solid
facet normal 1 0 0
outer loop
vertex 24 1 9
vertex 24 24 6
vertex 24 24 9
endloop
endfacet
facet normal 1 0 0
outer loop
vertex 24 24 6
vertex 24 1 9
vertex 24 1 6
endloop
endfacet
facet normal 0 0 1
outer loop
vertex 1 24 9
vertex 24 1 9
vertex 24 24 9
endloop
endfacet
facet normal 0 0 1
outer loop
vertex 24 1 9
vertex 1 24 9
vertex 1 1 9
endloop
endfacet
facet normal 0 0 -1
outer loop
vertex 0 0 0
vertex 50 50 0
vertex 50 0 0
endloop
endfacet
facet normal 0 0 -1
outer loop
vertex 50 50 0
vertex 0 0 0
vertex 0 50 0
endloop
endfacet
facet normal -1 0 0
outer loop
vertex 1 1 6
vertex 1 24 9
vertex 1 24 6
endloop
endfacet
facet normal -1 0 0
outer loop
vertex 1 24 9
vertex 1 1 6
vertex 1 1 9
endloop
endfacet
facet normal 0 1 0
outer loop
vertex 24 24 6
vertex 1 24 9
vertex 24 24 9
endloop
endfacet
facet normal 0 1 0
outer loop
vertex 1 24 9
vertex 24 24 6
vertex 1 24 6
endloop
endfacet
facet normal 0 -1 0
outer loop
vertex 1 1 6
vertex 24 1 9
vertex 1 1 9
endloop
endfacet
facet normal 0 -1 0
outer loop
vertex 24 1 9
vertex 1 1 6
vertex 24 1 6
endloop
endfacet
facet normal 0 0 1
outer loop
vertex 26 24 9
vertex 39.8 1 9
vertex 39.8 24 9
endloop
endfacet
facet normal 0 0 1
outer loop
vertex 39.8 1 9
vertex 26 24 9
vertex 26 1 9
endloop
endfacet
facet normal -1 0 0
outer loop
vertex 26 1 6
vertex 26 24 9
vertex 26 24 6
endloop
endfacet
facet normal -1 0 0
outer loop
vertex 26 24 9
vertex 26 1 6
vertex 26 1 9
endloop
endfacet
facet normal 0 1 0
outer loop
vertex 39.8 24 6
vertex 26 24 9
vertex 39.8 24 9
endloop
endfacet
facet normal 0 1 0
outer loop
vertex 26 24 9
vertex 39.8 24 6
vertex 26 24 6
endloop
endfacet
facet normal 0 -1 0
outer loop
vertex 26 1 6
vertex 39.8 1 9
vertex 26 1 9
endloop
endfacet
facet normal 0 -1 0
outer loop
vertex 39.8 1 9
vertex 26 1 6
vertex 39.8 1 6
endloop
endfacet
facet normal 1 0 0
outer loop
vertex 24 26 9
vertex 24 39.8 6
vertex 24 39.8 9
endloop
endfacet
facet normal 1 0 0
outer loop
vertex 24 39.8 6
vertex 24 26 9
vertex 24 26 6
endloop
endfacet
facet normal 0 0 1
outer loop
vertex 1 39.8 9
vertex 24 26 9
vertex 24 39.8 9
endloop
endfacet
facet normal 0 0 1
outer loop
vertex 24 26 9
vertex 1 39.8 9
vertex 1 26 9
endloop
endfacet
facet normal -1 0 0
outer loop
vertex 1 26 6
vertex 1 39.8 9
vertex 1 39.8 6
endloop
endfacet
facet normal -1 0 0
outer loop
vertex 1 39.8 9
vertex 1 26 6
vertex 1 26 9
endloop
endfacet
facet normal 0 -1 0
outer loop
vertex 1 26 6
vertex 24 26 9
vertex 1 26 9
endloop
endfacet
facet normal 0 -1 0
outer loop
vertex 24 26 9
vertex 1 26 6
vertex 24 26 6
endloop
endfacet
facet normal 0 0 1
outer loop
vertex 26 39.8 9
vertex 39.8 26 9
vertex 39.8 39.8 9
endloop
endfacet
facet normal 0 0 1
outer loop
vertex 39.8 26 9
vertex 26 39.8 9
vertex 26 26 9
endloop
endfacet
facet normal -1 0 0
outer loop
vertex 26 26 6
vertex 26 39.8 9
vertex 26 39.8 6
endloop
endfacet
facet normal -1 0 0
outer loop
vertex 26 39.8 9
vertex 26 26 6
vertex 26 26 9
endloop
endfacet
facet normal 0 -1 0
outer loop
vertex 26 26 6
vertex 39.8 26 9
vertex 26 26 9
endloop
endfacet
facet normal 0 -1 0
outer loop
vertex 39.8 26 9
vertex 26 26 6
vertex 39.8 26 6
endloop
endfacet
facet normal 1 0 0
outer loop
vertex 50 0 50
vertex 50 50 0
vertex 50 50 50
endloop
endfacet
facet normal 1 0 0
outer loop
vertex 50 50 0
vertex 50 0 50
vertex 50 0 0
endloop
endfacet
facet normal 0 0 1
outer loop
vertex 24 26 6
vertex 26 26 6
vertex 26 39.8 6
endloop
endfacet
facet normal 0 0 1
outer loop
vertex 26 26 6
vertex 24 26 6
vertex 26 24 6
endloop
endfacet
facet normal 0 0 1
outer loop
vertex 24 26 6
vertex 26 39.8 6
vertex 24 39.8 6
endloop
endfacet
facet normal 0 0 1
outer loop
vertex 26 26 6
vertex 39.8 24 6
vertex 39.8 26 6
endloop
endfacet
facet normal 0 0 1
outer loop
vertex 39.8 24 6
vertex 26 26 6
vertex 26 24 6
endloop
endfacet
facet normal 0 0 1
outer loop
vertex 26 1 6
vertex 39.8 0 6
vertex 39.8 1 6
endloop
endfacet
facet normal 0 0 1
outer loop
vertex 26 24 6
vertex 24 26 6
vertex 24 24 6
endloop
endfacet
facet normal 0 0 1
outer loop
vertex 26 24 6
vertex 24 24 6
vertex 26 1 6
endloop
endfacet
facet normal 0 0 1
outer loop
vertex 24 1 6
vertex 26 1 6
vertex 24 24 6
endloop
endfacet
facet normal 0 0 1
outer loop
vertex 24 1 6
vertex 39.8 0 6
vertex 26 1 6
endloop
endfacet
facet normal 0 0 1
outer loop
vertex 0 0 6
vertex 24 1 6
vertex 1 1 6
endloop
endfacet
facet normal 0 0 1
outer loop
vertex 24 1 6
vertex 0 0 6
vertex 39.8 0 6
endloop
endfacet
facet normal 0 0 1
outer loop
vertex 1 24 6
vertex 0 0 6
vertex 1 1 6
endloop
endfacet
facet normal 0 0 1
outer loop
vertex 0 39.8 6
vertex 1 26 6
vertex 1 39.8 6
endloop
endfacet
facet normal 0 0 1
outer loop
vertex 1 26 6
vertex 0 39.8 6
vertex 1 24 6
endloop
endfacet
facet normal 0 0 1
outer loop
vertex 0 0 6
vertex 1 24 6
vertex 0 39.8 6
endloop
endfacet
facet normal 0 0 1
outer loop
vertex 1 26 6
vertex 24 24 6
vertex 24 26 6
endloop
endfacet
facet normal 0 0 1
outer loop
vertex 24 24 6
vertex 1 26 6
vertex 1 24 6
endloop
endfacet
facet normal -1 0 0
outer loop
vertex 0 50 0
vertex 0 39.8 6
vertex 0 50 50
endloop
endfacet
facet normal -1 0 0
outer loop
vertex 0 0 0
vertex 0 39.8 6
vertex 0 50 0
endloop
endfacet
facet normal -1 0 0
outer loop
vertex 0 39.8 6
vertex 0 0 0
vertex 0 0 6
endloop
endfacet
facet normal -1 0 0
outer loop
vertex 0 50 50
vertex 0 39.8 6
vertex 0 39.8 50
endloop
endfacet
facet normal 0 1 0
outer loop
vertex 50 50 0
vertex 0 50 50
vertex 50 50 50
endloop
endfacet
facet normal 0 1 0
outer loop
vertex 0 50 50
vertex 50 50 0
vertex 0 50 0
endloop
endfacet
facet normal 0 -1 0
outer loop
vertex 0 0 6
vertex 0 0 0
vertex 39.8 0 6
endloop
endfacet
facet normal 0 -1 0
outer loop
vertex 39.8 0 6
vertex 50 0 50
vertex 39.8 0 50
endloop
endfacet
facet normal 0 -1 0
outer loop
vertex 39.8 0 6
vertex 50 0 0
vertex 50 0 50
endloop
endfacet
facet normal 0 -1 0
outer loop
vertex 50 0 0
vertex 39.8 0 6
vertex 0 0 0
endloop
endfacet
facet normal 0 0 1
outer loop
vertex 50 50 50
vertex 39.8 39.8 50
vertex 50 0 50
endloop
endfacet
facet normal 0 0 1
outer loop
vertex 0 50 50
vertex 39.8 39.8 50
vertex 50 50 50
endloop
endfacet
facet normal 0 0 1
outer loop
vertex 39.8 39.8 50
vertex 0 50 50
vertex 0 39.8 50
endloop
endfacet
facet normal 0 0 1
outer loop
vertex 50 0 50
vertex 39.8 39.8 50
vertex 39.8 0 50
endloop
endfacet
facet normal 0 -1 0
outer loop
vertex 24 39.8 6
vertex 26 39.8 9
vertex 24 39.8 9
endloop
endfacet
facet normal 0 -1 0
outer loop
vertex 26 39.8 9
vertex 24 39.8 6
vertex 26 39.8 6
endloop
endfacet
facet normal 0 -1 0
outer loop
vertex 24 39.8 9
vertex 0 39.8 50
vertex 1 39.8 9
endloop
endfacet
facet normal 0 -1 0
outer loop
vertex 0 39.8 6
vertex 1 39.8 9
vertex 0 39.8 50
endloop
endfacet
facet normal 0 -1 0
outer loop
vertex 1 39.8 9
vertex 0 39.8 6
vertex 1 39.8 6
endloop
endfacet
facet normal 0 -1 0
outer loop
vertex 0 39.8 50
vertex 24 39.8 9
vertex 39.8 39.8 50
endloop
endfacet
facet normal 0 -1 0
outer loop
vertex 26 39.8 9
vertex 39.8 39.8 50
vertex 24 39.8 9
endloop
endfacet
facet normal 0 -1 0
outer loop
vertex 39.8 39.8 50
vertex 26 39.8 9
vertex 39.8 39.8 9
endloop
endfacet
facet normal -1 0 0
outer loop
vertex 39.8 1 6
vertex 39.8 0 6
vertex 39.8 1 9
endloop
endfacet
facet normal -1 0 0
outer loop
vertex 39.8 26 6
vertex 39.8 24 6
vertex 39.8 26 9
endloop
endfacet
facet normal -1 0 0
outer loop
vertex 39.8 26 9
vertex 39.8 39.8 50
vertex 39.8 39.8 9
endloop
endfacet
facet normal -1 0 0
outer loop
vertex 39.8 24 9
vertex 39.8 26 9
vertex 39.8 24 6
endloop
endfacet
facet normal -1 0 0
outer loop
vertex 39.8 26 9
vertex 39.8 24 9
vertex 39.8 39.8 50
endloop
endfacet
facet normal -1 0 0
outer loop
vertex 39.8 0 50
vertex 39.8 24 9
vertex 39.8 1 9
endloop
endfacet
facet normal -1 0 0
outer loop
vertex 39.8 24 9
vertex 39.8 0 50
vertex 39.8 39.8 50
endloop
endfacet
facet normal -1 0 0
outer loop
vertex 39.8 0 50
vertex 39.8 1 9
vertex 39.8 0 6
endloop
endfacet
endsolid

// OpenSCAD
color("LightGray") {
    translate([1,1,0]) cube([23,23,9]);
    translate([25+1,1,0]) cube([23,23,9]);
    translate([1,25+1,0]) cube([23,23,9]);
    translate([25+1,25+1,0]) cube([23,23,9]);
}
color("Grey") {
    cube([50,50,6]);
    translate([0,50-10.2,0]) cube([50,10.2,50]);
    translate([50-10.2,0,0]) cube([10.2,50,50]);
}
